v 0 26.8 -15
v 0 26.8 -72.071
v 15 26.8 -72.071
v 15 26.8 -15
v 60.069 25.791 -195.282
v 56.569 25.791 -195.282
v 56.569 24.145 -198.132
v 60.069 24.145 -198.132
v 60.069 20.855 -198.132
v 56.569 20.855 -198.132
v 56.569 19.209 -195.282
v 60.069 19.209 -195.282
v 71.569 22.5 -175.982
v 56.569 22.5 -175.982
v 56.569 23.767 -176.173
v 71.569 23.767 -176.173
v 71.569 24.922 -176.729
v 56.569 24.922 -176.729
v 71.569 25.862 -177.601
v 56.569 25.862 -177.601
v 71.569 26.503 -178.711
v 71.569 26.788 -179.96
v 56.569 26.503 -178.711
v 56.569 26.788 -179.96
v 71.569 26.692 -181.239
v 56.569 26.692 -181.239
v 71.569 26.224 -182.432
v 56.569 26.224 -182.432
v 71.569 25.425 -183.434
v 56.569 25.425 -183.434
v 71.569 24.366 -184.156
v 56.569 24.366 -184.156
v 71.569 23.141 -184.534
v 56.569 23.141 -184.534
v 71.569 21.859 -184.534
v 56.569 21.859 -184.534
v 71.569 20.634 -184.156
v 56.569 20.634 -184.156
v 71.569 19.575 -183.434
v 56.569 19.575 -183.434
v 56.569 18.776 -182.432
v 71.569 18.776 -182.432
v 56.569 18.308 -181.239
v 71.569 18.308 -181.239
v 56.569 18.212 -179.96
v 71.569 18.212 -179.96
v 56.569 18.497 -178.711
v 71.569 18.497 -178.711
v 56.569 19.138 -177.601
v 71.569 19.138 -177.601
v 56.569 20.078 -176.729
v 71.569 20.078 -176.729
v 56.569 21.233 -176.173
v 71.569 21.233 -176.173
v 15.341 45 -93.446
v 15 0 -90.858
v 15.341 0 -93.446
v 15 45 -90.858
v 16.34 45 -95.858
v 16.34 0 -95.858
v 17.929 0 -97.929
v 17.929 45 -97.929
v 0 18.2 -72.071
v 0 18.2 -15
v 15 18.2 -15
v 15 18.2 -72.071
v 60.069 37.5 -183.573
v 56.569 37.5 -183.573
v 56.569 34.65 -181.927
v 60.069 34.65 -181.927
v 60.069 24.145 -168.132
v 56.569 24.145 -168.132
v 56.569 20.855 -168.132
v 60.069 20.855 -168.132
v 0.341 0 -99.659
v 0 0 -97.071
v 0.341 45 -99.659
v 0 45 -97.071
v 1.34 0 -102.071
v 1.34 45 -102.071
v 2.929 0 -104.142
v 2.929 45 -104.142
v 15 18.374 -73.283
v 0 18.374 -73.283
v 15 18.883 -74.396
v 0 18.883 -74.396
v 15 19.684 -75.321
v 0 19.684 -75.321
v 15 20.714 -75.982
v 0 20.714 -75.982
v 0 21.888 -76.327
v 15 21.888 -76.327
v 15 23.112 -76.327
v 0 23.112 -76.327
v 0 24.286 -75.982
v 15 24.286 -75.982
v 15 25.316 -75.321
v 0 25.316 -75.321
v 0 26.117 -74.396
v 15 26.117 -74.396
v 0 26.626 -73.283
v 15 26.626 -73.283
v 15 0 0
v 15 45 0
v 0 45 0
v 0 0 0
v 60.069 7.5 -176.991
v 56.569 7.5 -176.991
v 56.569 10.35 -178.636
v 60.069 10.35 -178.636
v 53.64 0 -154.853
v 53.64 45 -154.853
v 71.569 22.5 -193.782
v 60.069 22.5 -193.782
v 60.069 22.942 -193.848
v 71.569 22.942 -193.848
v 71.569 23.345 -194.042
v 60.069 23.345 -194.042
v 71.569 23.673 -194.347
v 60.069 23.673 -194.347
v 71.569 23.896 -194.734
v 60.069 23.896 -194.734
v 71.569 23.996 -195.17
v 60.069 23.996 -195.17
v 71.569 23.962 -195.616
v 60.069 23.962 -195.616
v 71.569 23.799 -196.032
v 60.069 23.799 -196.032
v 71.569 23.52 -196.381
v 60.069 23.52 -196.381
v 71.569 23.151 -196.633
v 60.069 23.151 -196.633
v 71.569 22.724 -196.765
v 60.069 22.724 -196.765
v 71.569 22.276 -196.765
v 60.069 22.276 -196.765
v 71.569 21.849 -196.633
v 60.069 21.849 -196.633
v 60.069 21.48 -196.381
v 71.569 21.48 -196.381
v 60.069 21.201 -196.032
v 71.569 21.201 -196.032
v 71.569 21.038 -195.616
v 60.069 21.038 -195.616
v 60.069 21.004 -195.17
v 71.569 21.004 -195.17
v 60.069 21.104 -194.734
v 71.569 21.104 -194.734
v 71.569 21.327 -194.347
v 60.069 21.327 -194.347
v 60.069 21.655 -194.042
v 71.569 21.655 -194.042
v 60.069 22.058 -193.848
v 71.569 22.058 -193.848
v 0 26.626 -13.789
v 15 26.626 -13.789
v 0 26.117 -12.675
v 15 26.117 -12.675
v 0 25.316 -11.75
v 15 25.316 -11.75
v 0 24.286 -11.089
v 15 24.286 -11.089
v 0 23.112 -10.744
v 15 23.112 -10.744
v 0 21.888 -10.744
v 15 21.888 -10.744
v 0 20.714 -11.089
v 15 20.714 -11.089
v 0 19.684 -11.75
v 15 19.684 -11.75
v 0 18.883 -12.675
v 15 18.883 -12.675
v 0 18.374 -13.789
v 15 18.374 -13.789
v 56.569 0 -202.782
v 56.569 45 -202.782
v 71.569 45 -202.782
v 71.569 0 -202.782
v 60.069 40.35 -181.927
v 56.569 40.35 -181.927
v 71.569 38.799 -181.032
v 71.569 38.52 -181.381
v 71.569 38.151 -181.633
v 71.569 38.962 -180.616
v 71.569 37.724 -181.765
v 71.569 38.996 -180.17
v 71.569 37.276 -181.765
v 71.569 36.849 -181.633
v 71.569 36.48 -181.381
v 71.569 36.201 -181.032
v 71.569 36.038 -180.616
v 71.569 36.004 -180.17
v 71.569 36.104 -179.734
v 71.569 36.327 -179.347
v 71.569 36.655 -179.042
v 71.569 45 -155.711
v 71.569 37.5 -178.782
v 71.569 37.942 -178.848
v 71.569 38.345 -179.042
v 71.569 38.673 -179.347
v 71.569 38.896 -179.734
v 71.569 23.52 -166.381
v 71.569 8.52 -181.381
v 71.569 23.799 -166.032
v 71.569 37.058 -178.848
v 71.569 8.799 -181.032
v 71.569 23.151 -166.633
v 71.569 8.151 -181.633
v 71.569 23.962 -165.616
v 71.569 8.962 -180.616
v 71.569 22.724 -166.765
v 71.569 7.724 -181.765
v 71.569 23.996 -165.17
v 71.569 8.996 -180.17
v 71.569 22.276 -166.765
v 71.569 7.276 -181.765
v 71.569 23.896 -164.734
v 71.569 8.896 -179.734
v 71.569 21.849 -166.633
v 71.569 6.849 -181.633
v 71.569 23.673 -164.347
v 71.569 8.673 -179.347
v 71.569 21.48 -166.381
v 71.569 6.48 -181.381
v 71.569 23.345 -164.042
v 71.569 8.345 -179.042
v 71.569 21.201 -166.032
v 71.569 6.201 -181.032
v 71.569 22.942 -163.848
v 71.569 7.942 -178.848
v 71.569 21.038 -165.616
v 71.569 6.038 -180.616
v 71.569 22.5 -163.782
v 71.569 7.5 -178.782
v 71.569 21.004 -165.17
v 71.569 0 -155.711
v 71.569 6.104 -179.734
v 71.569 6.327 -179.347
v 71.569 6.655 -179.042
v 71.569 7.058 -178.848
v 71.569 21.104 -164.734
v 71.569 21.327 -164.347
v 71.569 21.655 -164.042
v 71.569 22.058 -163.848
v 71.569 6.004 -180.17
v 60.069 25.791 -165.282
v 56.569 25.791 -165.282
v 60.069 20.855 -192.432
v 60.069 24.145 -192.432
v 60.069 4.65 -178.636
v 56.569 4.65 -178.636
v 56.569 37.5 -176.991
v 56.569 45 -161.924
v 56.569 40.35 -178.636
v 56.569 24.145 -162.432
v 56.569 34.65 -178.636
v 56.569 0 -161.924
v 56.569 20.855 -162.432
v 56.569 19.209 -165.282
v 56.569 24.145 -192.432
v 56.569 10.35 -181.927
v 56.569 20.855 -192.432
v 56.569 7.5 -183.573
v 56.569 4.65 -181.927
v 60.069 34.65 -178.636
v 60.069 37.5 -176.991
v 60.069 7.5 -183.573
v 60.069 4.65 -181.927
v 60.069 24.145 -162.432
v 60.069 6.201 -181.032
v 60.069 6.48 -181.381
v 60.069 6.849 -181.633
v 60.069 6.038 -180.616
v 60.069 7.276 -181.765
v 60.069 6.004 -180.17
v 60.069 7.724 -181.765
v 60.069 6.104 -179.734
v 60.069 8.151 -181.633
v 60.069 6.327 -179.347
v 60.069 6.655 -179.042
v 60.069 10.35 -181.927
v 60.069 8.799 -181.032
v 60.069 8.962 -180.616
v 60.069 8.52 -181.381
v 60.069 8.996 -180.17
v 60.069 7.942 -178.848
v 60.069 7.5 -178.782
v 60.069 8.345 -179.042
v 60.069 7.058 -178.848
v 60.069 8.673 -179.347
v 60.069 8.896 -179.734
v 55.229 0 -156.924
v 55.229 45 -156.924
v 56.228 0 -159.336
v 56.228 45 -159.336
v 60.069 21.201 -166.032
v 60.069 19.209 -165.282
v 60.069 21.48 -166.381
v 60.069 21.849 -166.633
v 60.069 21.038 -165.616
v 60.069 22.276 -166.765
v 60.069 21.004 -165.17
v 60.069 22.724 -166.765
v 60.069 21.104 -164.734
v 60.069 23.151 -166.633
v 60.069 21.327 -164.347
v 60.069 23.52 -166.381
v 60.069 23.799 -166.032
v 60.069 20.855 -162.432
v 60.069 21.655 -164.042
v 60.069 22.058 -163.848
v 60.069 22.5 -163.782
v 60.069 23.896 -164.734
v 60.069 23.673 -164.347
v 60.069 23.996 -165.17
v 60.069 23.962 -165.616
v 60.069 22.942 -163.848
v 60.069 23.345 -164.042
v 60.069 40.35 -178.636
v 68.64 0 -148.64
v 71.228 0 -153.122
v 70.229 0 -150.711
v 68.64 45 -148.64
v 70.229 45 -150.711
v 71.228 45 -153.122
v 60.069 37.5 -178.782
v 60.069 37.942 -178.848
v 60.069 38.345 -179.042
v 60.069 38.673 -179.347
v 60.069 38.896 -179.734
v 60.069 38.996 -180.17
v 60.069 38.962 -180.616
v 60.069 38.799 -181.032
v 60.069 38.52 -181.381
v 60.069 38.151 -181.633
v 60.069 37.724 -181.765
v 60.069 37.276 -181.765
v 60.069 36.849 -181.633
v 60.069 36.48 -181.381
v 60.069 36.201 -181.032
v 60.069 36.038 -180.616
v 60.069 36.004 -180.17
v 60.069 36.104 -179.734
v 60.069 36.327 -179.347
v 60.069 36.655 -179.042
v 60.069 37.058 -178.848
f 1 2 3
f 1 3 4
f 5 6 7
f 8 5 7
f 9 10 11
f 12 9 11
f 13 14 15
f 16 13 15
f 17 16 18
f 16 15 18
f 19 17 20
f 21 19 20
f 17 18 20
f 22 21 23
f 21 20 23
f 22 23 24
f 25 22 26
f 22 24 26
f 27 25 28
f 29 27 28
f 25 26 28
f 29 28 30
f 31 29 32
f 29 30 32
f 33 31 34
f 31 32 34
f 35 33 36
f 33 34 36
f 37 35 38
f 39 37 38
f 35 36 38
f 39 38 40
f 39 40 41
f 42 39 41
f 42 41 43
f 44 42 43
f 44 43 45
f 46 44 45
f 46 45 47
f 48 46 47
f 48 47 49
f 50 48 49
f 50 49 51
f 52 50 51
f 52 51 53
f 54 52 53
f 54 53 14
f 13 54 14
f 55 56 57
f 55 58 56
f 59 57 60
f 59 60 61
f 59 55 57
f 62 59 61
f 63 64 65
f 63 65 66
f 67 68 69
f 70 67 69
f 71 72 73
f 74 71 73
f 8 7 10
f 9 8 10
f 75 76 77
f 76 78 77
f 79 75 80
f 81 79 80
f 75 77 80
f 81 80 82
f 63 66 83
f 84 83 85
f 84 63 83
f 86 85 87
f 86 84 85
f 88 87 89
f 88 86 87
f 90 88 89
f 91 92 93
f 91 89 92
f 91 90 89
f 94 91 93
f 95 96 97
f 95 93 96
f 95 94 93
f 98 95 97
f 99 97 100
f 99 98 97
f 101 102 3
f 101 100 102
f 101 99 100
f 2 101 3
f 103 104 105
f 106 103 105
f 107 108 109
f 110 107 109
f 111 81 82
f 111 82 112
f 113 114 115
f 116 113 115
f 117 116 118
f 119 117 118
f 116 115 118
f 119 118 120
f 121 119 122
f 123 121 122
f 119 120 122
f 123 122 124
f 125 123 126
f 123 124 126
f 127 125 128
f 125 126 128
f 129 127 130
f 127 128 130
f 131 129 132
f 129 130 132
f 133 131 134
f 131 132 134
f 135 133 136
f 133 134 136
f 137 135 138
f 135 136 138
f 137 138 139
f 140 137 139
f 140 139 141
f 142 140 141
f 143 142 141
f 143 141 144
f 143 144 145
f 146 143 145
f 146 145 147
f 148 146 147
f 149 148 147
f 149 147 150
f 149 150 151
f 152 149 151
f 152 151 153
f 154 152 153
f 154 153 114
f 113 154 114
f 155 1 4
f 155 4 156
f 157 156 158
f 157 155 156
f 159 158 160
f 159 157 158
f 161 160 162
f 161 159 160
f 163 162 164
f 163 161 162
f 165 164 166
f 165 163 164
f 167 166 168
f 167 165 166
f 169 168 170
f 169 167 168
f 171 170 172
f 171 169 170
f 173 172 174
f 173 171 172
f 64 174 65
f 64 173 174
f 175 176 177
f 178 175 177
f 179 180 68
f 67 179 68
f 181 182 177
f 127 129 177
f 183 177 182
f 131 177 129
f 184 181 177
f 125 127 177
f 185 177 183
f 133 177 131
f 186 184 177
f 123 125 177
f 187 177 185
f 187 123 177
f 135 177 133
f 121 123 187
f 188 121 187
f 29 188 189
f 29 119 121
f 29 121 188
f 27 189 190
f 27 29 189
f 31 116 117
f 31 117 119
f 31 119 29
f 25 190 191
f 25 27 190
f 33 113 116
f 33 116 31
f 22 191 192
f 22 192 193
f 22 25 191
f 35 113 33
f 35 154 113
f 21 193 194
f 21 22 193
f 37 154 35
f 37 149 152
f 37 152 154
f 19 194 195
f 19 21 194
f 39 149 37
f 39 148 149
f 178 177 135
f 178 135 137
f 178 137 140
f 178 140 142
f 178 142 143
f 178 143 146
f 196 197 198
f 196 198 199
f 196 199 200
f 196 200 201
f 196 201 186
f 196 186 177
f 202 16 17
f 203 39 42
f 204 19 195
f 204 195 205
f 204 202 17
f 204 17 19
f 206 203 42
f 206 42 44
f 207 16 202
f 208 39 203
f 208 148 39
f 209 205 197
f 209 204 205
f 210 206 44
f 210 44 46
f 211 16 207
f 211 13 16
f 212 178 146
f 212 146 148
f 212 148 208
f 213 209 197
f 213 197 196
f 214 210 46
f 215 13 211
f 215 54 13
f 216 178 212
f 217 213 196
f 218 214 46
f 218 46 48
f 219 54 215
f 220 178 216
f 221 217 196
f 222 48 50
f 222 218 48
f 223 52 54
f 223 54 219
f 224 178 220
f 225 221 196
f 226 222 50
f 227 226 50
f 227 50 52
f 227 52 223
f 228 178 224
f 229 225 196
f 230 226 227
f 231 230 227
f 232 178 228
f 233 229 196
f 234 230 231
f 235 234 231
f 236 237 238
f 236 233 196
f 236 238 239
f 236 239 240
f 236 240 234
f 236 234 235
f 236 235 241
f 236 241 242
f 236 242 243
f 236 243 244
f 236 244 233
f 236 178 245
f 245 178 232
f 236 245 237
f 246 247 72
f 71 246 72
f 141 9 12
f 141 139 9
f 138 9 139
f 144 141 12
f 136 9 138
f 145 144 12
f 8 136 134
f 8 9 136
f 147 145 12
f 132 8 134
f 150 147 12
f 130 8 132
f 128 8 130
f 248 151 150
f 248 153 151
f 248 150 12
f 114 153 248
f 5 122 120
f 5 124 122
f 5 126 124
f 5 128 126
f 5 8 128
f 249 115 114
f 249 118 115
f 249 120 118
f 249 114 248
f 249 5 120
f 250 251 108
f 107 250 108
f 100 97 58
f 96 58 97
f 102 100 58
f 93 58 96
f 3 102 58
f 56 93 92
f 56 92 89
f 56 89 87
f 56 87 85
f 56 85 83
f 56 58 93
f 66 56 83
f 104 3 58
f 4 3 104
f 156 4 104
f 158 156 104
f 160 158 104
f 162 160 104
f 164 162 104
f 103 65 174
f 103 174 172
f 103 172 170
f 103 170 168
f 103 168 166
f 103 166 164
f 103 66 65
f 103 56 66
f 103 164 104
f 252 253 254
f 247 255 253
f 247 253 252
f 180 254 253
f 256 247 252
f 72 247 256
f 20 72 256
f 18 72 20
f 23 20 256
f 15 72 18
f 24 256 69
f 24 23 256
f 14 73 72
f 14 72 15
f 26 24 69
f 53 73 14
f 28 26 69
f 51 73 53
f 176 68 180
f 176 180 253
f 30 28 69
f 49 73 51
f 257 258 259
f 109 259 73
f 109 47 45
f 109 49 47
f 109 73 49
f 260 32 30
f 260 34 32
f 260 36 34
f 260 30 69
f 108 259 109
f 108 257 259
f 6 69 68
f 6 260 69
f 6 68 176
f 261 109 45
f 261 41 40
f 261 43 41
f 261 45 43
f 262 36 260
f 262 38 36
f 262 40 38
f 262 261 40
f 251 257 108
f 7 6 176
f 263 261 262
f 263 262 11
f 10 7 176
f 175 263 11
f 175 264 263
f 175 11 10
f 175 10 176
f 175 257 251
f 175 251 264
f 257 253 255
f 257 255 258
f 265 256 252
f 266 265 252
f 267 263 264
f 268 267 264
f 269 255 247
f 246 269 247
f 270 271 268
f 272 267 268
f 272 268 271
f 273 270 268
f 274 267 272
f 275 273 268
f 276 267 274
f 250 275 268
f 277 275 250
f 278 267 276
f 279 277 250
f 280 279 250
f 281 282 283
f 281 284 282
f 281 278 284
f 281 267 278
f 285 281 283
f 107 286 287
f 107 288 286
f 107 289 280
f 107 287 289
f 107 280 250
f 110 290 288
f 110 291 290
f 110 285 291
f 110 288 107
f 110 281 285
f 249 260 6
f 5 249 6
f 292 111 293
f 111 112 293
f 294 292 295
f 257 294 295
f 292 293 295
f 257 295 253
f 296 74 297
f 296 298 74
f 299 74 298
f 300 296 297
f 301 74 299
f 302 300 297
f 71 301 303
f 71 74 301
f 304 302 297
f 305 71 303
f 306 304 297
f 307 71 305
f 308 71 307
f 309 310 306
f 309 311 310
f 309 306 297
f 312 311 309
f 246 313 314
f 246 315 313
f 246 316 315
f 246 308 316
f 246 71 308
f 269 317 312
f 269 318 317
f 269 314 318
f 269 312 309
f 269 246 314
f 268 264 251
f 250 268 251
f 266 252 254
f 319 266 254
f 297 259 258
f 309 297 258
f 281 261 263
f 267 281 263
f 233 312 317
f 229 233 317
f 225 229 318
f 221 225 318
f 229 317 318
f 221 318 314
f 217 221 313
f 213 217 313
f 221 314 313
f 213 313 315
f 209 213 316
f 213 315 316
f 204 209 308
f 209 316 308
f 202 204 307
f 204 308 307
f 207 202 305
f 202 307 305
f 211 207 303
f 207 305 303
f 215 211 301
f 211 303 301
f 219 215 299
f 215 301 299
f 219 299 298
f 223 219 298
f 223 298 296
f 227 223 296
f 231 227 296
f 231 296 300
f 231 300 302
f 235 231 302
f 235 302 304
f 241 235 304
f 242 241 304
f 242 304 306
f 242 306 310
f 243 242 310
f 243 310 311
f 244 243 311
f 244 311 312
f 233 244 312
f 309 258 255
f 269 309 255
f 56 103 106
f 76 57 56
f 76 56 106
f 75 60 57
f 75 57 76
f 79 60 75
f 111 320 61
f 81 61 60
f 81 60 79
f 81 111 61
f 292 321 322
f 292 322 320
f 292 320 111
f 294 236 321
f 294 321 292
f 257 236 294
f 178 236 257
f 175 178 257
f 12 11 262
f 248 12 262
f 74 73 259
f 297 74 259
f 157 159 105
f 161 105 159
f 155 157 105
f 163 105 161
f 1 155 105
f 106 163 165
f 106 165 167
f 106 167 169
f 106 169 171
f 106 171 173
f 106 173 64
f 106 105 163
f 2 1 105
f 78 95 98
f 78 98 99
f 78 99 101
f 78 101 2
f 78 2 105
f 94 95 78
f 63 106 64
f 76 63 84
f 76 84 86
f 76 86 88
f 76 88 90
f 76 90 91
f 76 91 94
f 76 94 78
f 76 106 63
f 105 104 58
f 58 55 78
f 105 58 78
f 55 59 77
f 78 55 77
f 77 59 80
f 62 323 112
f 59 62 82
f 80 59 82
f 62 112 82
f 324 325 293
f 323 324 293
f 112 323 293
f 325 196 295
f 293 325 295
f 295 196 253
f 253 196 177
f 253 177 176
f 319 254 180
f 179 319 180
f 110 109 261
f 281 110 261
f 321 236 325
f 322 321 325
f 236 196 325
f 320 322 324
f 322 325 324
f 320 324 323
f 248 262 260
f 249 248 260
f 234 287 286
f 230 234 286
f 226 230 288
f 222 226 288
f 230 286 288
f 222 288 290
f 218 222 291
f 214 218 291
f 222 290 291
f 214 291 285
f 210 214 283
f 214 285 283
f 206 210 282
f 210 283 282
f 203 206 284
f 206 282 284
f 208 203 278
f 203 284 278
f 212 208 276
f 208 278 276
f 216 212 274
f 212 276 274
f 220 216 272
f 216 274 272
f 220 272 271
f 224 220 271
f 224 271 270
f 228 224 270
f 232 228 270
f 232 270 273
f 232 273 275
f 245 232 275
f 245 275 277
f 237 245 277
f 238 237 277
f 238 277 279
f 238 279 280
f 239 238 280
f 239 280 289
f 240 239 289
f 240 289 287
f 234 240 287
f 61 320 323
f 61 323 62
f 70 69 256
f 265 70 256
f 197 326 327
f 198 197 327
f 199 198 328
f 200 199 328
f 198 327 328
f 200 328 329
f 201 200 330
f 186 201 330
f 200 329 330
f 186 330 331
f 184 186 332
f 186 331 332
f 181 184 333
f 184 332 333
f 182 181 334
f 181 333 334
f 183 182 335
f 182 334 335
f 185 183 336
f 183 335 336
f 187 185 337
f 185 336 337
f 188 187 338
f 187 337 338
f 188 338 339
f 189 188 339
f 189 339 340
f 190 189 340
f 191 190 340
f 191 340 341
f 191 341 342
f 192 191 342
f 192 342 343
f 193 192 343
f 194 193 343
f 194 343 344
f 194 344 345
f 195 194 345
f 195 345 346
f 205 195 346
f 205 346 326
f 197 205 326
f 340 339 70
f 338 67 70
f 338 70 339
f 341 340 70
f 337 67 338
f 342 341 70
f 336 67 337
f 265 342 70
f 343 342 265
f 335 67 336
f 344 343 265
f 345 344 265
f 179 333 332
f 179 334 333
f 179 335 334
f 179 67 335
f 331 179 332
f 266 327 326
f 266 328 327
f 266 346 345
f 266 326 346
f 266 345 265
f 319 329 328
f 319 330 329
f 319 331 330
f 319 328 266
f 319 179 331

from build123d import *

# Parameters (mm, degrees)
BODY_DEPTH                            = 45
MOUNTING_HOLES_REACH                  = 17
SKETCH3_R                             = 4.3
SKETCH3_R_2                           = 1.5
MOUNTING_HOLE_COUNTERBORE_DEPTH       = 3.5
STRESS_CONCENTRATION_RELIEF_FILLETS_R = 10
SLOT_DEPTH                            = 72.568542495


with BuildPart() as part:
    # Sketch1 → Body (new body)
    with BuildSketch(Plane(origin=(0, 0, 0), x_dir=(1, 0, 0), z_dir=(0, 1, 0))):
        Polygon((0, 0), (0, 101.213203436), (56.568542495, 157.781745931), (56.568542495, 202.781745931), (71.568542495, 202.781745931), (71.568542495, 151.568542495), (15, 95), (15, 0), align=None)
    extrude(amount=BODY_DEPTH)

    # Sketch3 → Mounting Holes (cut, up to next)
    with BuildSketch(Plane.ZY.offset(-56.568542495), mode=Mode.PRIVATE) as mounting_holes_sk1:
        with Locations((-180.281745931, 22.5)):
            Circle(SKETCH3_R)
    mounting_holes_tool1 = extrude(mounting_holes_sk1.sketch, amount=-MOUNTING_HOLES_REACH, mode=Mode.PRIVATE) & part.part
    add(mounting_holes_tool1.solids().sort_by_distance((56.568542, 22.5, -180.281746))[0], mode=Mode.SUBTRACT)
    # Sketch3 → Mounting Holes (cut, up to next)
    with BuildSketch(Plane.ZY.offset(-56.568542495), mode=Mode.PRIVATE) as mounting_holes_sk2:
        with Locations((-180.281745931, 37.5)):
            Circle(SKETCH3_R_2)
    mounting_holes_tool2 = extrude(mounting_holes_sk2.sketch, amount=-MOUNTING_HOLES_REACH, mode=Mode.PRIVATE) & part.part
    add(mounting_holes_tool2.solids().sort_by_distance((56.568542, 37.5, -180.281746))[0], mode=Mode.SUBTRACT)
    # Sketch3 → Mounting Holes (cut, up to next)
    with BuildSketch(Plane.ZY.offset(-56.568542495), mode=Mode.PRIVATE) as mounting_holes_sk3:
        with Locations((-165.281745931, 22.5)):
            Circle(SKETCH3_R_2)
    mounting_holes_tool3 = extrude(mounting_holes_sk3.sketch, amount=-MOUNTING_HOLES_REACH, mode=Mode.PRIVATE) & part.part
    add(mounting_holes_tool3.solids().sort_by_distance((56.568542, 22.5, -165.281746))[0], mode=Mode.SUBTRACT)
    # Sketch3 → Mounting Holes (cut, up to next)
    with BuildSketch(Plane.ZY.offset(-56.568542495), mode=Mode.PRIVATE) as mounting_holes_sk4:
        with Locations((-180.281745931, 7.5)):
            Circle(SKETCH3_R_2)
    mounting_holes_tool4 = extrude(mounting_holes_sk4.sketch, amount=-MOUNTING_HOLES_REACH, mode=Mode.PRIVATE) & part.part
    add(mounting_holes_tool4.solids().sort_by_distance((56.568542, 7.5, -180.281746))[0], mode=Mode.SUBTRACT)
    # Sketch3 → Mounting Holes (cut, up to next)
    with BuildSketch(Plane.ZY.offset(-56.568542495), mode=Mode.PRIVATE) as mounting_holes_sk5:
        with Locations((-195.281745931, 22.5)):
            Circle(SKETCH3_R_2)
    mounting_holes_tool5 = extrude(mounting_holes_sk5.sketch, amount=-MOUNTING_HOLES_REACH, mode=Mode.PRIVATE) & part.part
    add(mounting_holes_tool5.solids().sort_by_distance((56.568542, 22.5, -195.281746))[0], mode=Mode.SUBTRACT)

    # Sketch4 → Mounting Hole Counterbore (cut)
    with BuildSketch(Plane.ZY.offset(-56.568542495)):
        Polygon((-162.431745931, 20.854551733), (-162.431745931, 24.145448267), (-165.281745931, 25.790896534), (-168.131745931, 24.145448267), (-168.131745931, 20.854551733), (-165.281745931, 19.209103466), align=None)
        Polygon((-178.636297663, 40.35), (-181.927194198, 40.35), (-183.572642465, 37.5), (-181.927194198, 34.65), (-178.636297663, 34.65), (-176.990849396, 37.5), align=None)
        Polygon((-181.927194198, 4.65), (-178.636297663, 4.65), (-176.990849396, 7.5), (-178.636297663, 10.35), (-181.927194198, 10.35), (-183.572642465, 7.5), align=None)
        Polygon((-198.131745931, 24.145448267), (-198.131745931, 20.854551733), (-195.281745931, 19.209103466), (-192.431745931, 20.854551733), (-192.431745931, 24.145448267), (-195.281745931, 25.790896534), align=None)
    extrude(amount=-MOUNTING_HOLE_COUNTERBORE_DEPTH, mode=Mode.SUBTRACT)

    # Stress Concentration Relief Fillets
    stress_concentration_relief_fillets_edges = [part.edges().sort_by_distance(p)[0] for p in [
        (0, 22.5, -101.213203436),
        (56.568542495, 22.5, -157.781745931),
        (71.568542495, 22.5, -151.568542495),
        (15, 22.5, -95),
    ]]
    fillet(stress_concentration_relief_fillets_edges, radius=STRESS_CONCENTRATION_RELIEF_FILLETS_R)

    # Sketch5 → Slot (cut, through all)
    with BuildSketch(Plane.ZY):
        with BuildLine():
            Line((-72.071067812, 26.8), (-15, 26.8))
            ThreePointArc((-15, 26.8), (-10.7, 22.5), (-15, 18.2))
            Line((-15, 18.2), (-72.071067812, 18.2))
            ThreePointArc((-72.071067812, 18.2), (-76.371067812, 22.5), (-72.071067812, 26.8))
        make_face()
    extrude(amount=-SLOT_DEPTH, mode=Mode.SUBTRACT)


solid = part.part
